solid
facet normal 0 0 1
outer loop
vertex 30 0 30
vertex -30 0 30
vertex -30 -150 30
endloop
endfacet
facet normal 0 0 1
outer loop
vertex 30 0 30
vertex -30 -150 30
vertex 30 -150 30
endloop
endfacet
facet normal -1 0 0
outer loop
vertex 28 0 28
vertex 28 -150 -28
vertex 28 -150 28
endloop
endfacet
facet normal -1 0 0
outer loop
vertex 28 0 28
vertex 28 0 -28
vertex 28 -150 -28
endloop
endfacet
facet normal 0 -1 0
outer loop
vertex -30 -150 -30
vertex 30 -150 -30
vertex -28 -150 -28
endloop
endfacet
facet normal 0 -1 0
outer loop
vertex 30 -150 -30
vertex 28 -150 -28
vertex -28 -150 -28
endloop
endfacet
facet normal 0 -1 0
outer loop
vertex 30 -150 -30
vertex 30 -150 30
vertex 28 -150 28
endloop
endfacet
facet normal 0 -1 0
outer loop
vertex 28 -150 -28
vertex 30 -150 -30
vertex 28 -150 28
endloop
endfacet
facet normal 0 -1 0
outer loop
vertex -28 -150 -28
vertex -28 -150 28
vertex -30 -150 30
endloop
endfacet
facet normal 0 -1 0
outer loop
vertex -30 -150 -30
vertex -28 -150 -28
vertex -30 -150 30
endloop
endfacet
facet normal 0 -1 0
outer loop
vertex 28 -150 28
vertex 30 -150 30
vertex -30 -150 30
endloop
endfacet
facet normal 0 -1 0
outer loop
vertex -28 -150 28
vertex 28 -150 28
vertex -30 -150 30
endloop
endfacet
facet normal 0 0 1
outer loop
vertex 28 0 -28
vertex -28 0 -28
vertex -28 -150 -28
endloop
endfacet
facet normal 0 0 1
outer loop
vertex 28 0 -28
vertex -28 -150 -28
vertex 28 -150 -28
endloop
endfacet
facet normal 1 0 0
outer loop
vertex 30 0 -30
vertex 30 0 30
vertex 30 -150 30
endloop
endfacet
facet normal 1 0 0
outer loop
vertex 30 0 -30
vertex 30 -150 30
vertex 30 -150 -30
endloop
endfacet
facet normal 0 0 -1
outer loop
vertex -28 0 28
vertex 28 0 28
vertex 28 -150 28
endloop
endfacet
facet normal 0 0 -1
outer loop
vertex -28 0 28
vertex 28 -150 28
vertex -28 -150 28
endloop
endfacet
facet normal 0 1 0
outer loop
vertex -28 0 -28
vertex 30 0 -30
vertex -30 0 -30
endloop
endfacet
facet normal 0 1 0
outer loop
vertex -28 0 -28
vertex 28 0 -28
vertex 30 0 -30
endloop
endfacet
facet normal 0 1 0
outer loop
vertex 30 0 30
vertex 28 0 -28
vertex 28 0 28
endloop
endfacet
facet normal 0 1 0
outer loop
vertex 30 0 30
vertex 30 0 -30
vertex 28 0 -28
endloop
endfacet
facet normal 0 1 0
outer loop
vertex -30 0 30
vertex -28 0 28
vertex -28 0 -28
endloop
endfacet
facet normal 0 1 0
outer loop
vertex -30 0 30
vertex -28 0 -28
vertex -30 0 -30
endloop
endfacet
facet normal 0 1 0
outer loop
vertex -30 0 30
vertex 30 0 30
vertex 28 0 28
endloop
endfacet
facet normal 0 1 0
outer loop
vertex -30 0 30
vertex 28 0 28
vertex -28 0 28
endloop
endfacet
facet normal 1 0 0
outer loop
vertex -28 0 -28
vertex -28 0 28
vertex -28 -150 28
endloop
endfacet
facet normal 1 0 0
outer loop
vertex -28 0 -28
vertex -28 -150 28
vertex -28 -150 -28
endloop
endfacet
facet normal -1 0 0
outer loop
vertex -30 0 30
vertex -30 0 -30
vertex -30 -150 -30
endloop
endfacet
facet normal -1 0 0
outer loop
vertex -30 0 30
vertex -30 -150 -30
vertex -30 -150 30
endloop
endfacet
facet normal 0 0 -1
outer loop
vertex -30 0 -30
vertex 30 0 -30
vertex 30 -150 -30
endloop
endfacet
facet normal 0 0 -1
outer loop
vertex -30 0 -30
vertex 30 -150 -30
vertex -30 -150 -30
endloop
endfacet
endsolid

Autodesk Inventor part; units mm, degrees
ref_plane "YZ Plane" through (0, 0, 0) normal (1, 0, 0) x (0, 1, 0)
ref_plane "XZ Plane" through (0, 0, 0) normal (0, 1, 0) x (-1, 0, 0)
ref_plane "XY Plane" through (0, 0, 0) normal (0, 0, 1) x (1, 0, 0)
sketch "Sketch9" plane through (0, 0, 0) normal (0, 1, 0) x (-1, 0, 0)
  line L0 (30, 30) -> (-30, 30)
  line L1 (-30, 30) -> (-30, -30)
  line L2 (-30, -30) -> (30, -30)
  line L3 (30, -30) -> (30, 30)
  line L4 (30, 30) -> (-30, -30) construction
  line L5 (-30, 30) -> (30, -30) construction
  line L6 (-28, 28) -> (28, 28)
  line L7 (28, 28) -> (28, -28)
  line L8 (28, -28) -> (-28, -28)
  line L9 (-28, -28) -> (-28, 28)
  point P0 (0, 0)
  dimension "d172" = 60
  dimension "d173" = 60
  dimension "d174" = 2
extrude "Extrusion3" add sketch "Sketch9" against normal blind 150
properties part number "TZS 1762 FDS 940x50 column" material "Stainless Steel"
